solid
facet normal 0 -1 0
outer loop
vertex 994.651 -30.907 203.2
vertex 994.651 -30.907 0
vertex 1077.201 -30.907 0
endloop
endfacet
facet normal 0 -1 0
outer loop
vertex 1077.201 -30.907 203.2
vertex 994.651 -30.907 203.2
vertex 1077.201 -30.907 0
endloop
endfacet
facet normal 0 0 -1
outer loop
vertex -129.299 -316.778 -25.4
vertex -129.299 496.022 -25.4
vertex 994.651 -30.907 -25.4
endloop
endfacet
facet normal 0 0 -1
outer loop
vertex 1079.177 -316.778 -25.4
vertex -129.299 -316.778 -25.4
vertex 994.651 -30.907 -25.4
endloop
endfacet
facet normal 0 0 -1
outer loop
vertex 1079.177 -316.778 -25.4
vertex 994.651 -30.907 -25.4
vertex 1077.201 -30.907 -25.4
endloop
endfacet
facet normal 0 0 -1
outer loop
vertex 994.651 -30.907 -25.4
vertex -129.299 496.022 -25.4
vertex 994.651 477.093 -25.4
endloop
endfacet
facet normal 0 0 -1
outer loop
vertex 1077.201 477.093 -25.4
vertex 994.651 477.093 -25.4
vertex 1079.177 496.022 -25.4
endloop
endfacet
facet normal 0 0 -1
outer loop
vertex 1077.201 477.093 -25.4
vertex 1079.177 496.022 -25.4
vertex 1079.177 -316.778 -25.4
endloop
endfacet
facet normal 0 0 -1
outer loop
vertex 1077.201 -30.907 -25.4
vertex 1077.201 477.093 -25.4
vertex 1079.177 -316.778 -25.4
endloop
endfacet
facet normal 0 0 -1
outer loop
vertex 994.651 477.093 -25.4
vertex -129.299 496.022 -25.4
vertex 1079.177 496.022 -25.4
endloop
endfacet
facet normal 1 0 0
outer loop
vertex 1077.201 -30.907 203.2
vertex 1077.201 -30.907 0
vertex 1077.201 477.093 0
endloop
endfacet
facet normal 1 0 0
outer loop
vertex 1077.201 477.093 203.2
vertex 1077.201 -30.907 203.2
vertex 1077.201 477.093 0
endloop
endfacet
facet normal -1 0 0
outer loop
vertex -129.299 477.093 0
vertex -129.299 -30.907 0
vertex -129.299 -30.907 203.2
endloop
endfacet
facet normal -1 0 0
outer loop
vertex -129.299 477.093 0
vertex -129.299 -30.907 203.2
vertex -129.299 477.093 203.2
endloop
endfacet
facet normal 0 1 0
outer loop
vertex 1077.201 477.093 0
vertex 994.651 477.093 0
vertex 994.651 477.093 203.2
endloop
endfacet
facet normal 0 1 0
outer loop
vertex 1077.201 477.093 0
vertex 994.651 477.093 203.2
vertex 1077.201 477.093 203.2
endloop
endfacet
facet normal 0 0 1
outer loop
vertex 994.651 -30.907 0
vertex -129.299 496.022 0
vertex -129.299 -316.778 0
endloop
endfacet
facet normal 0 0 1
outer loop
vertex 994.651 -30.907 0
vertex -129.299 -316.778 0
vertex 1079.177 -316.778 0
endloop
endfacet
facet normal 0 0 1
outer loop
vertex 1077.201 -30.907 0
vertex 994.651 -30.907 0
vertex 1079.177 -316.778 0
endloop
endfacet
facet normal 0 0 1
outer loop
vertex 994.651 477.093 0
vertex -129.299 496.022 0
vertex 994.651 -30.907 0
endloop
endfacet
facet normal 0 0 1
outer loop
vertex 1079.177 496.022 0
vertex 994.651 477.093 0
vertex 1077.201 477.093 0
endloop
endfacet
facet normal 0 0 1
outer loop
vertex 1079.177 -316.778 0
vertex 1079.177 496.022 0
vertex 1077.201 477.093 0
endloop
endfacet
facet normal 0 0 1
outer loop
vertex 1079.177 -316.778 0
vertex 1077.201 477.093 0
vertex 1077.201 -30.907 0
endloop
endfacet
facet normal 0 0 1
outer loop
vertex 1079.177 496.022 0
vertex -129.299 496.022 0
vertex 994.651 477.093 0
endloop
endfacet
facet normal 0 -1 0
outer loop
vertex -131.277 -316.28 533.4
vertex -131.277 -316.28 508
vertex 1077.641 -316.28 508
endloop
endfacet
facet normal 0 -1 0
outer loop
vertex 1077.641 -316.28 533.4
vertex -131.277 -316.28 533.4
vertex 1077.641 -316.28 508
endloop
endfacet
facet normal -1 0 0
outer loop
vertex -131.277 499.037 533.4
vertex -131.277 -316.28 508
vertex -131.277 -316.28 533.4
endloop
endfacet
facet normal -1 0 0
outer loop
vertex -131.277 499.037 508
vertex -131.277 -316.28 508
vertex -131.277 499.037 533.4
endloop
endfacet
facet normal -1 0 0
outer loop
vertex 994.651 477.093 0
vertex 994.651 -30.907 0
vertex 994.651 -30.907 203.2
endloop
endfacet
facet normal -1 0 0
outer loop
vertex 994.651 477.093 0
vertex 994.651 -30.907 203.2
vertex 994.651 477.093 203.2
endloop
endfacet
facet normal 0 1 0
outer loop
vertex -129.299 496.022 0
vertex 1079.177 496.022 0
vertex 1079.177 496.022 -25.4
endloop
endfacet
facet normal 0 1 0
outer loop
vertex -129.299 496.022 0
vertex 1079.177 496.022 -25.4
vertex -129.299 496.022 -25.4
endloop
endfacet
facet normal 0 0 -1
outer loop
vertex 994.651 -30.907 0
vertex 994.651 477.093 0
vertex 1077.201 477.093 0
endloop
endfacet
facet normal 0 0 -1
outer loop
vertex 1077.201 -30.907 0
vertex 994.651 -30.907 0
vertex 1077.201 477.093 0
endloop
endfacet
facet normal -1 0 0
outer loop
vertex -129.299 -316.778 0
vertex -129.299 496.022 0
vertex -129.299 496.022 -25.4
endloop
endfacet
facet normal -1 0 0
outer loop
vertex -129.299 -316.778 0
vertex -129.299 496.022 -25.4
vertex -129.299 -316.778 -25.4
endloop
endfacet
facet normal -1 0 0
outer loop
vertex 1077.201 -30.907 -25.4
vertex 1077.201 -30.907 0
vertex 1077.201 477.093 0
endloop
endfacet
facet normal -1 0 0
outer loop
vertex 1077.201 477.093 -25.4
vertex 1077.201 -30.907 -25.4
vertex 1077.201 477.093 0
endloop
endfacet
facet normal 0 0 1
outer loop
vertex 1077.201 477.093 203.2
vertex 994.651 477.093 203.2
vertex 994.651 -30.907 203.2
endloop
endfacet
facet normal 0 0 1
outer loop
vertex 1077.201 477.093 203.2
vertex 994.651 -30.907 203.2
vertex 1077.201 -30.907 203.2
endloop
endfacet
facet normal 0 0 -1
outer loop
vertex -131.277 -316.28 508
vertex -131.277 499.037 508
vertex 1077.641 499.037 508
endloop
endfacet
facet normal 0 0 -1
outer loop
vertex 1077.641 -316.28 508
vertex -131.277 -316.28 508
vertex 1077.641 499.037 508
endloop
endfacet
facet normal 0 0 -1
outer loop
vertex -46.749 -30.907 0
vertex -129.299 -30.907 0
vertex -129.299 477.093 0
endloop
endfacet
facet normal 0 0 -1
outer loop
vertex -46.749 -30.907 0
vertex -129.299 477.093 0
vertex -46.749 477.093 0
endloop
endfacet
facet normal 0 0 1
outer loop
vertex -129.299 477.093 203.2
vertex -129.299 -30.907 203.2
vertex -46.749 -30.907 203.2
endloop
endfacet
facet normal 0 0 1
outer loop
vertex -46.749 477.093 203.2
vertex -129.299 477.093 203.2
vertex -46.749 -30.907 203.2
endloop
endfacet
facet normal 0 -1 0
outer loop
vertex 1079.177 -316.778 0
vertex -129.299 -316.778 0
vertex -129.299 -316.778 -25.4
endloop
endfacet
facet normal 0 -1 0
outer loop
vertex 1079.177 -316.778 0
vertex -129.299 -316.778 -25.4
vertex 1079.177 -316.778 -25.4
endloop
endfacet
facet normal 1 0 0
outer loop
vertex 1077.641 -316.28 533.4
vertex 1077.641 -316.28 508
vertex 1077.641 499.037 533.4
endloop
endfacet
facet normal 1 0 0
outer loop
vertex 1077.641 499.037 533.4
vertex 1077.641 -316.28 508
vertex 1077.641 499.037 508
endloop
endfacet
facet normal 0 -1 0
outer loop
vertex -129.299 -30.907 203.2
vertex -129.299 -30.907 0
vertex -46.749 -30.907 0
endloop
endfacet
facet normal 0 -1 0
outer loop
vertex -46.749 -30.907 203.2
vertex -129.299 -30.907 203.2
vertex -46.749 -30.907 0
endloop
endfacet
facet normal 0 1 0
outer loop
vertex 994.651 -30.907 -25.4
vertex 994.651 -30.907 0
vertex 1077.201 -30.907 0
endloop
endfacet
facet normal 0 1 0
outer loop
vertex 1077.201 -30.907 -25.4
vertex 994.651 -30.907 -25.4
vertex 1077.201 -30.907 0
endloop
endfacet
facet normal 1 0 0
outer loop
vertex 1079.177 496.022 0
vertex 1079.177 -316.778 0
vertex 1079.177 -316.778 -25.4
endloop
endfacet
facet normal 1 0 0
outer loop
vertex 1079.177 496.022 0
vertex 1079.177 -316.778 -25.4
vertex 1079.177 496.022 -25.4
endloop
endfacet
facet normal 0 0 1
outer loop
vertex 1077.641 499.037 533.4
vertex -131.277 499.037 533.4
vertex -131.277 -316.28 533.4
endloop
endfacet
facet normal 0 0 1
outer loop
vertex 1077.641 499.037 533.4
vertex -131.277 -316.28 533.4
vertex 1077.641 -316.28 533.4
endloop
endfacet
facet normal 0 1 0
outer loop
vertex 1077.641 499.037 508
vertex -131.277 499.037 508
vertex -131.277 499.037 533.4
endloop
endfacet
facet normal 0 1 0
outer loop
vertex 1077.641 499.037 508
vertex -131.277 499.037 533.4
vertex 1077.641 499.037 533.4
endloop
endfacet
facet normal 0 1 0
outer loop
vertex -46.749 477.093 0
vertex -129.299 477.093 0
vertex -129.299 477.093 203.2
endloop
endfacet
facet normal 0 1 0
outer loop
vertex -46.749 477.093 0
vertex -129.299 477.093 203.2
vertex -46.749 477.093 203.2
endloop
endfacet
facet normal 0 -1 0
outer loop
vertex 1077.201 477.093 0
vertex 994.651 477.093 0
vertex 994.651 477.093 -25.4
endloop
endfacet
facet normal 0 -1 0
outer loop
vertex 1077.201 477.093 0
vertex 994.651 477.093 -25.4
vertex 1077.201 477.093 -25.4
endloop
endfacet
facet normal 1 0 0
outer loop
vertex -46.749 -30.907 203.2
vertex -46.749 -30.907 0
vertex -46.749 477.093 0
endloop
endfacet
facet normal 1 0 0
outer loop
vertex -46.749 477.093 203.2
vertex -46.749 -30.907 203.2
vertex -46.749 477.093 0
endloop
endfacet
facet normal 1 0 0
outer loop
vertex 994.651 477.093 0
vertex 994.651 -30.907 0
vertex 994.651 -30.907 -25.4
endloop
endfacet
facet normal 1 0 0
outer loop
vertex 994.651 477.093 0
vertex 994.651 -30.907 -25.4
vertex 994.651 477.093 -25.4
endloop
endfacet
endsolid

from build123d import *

# Parameters (mm, degrees)
F0_W     = 82.55
F0_H     = 508
F1_DEPTH = 203.2
F2_DEPTH = 25.4
F4_W     = 1208.918184042
F4_H     = 815.3168857098
F5_DEPTH = 25.4


with BuildPart() as f1:
    # F0 (on Top) → F1 (new body)
    with BuildSketch(Plane.XY):
        with Locations((-88.0237461865, 223.0930265933)):
            Rectangle(F0_W, F0_H)
    extrude(amount=F1_DEPTH)


with BuildPart() as f1b:
    # F0 (on Top) → F1, piece 2 (new body)
    with BuildSketch(Plane.XY):
        with Locations((1035.9262538135, 223.0930265933)):
            Rectangle(F0_W, F0_H)
    extrude(amount=F1_DEPTH)


with BuildPart() as f2:
    # F0 (on Top) → F2 (new body)
    with BuildSketch(Plane.XY):
        Polygon((-129.2987461865, 496.0216650993), (-129.2987461865, 477.0930265933), (-46.7487461865, 477.0930265933), (-46.7487461865, -30.9069734067), (-129.2987461865, -30.9069734067), (-129.2987461865, -316.7783349007), (1079.1771411896, -316.7783349007), (1079.1771411896, 496.0216650993), align=None)
        with Locations((1035.9262538135, 223.0930265933)):
            Rectangle(F0_W, F0_H, mode=Mode.SUBTRACT)
        with Locations((-88.0237461865, 223.0930265933)):
            Rectangle(F0_W, F0_H)
    extrude(amount=-F2_DEPTH)


with BuildPart() as f5:
    # F4 (on offset) → F5 (new body)
    with BuildSketch(Plane.XY.offset(508)):
        with Locations((473.1820374727, 91.3789123297)):
            Rectangle(F4_W, F4_H)
    extrude(amount=F5_DEPTH)


solid = Compound([f1.part, f1b.part, f2.part, f5.part])
